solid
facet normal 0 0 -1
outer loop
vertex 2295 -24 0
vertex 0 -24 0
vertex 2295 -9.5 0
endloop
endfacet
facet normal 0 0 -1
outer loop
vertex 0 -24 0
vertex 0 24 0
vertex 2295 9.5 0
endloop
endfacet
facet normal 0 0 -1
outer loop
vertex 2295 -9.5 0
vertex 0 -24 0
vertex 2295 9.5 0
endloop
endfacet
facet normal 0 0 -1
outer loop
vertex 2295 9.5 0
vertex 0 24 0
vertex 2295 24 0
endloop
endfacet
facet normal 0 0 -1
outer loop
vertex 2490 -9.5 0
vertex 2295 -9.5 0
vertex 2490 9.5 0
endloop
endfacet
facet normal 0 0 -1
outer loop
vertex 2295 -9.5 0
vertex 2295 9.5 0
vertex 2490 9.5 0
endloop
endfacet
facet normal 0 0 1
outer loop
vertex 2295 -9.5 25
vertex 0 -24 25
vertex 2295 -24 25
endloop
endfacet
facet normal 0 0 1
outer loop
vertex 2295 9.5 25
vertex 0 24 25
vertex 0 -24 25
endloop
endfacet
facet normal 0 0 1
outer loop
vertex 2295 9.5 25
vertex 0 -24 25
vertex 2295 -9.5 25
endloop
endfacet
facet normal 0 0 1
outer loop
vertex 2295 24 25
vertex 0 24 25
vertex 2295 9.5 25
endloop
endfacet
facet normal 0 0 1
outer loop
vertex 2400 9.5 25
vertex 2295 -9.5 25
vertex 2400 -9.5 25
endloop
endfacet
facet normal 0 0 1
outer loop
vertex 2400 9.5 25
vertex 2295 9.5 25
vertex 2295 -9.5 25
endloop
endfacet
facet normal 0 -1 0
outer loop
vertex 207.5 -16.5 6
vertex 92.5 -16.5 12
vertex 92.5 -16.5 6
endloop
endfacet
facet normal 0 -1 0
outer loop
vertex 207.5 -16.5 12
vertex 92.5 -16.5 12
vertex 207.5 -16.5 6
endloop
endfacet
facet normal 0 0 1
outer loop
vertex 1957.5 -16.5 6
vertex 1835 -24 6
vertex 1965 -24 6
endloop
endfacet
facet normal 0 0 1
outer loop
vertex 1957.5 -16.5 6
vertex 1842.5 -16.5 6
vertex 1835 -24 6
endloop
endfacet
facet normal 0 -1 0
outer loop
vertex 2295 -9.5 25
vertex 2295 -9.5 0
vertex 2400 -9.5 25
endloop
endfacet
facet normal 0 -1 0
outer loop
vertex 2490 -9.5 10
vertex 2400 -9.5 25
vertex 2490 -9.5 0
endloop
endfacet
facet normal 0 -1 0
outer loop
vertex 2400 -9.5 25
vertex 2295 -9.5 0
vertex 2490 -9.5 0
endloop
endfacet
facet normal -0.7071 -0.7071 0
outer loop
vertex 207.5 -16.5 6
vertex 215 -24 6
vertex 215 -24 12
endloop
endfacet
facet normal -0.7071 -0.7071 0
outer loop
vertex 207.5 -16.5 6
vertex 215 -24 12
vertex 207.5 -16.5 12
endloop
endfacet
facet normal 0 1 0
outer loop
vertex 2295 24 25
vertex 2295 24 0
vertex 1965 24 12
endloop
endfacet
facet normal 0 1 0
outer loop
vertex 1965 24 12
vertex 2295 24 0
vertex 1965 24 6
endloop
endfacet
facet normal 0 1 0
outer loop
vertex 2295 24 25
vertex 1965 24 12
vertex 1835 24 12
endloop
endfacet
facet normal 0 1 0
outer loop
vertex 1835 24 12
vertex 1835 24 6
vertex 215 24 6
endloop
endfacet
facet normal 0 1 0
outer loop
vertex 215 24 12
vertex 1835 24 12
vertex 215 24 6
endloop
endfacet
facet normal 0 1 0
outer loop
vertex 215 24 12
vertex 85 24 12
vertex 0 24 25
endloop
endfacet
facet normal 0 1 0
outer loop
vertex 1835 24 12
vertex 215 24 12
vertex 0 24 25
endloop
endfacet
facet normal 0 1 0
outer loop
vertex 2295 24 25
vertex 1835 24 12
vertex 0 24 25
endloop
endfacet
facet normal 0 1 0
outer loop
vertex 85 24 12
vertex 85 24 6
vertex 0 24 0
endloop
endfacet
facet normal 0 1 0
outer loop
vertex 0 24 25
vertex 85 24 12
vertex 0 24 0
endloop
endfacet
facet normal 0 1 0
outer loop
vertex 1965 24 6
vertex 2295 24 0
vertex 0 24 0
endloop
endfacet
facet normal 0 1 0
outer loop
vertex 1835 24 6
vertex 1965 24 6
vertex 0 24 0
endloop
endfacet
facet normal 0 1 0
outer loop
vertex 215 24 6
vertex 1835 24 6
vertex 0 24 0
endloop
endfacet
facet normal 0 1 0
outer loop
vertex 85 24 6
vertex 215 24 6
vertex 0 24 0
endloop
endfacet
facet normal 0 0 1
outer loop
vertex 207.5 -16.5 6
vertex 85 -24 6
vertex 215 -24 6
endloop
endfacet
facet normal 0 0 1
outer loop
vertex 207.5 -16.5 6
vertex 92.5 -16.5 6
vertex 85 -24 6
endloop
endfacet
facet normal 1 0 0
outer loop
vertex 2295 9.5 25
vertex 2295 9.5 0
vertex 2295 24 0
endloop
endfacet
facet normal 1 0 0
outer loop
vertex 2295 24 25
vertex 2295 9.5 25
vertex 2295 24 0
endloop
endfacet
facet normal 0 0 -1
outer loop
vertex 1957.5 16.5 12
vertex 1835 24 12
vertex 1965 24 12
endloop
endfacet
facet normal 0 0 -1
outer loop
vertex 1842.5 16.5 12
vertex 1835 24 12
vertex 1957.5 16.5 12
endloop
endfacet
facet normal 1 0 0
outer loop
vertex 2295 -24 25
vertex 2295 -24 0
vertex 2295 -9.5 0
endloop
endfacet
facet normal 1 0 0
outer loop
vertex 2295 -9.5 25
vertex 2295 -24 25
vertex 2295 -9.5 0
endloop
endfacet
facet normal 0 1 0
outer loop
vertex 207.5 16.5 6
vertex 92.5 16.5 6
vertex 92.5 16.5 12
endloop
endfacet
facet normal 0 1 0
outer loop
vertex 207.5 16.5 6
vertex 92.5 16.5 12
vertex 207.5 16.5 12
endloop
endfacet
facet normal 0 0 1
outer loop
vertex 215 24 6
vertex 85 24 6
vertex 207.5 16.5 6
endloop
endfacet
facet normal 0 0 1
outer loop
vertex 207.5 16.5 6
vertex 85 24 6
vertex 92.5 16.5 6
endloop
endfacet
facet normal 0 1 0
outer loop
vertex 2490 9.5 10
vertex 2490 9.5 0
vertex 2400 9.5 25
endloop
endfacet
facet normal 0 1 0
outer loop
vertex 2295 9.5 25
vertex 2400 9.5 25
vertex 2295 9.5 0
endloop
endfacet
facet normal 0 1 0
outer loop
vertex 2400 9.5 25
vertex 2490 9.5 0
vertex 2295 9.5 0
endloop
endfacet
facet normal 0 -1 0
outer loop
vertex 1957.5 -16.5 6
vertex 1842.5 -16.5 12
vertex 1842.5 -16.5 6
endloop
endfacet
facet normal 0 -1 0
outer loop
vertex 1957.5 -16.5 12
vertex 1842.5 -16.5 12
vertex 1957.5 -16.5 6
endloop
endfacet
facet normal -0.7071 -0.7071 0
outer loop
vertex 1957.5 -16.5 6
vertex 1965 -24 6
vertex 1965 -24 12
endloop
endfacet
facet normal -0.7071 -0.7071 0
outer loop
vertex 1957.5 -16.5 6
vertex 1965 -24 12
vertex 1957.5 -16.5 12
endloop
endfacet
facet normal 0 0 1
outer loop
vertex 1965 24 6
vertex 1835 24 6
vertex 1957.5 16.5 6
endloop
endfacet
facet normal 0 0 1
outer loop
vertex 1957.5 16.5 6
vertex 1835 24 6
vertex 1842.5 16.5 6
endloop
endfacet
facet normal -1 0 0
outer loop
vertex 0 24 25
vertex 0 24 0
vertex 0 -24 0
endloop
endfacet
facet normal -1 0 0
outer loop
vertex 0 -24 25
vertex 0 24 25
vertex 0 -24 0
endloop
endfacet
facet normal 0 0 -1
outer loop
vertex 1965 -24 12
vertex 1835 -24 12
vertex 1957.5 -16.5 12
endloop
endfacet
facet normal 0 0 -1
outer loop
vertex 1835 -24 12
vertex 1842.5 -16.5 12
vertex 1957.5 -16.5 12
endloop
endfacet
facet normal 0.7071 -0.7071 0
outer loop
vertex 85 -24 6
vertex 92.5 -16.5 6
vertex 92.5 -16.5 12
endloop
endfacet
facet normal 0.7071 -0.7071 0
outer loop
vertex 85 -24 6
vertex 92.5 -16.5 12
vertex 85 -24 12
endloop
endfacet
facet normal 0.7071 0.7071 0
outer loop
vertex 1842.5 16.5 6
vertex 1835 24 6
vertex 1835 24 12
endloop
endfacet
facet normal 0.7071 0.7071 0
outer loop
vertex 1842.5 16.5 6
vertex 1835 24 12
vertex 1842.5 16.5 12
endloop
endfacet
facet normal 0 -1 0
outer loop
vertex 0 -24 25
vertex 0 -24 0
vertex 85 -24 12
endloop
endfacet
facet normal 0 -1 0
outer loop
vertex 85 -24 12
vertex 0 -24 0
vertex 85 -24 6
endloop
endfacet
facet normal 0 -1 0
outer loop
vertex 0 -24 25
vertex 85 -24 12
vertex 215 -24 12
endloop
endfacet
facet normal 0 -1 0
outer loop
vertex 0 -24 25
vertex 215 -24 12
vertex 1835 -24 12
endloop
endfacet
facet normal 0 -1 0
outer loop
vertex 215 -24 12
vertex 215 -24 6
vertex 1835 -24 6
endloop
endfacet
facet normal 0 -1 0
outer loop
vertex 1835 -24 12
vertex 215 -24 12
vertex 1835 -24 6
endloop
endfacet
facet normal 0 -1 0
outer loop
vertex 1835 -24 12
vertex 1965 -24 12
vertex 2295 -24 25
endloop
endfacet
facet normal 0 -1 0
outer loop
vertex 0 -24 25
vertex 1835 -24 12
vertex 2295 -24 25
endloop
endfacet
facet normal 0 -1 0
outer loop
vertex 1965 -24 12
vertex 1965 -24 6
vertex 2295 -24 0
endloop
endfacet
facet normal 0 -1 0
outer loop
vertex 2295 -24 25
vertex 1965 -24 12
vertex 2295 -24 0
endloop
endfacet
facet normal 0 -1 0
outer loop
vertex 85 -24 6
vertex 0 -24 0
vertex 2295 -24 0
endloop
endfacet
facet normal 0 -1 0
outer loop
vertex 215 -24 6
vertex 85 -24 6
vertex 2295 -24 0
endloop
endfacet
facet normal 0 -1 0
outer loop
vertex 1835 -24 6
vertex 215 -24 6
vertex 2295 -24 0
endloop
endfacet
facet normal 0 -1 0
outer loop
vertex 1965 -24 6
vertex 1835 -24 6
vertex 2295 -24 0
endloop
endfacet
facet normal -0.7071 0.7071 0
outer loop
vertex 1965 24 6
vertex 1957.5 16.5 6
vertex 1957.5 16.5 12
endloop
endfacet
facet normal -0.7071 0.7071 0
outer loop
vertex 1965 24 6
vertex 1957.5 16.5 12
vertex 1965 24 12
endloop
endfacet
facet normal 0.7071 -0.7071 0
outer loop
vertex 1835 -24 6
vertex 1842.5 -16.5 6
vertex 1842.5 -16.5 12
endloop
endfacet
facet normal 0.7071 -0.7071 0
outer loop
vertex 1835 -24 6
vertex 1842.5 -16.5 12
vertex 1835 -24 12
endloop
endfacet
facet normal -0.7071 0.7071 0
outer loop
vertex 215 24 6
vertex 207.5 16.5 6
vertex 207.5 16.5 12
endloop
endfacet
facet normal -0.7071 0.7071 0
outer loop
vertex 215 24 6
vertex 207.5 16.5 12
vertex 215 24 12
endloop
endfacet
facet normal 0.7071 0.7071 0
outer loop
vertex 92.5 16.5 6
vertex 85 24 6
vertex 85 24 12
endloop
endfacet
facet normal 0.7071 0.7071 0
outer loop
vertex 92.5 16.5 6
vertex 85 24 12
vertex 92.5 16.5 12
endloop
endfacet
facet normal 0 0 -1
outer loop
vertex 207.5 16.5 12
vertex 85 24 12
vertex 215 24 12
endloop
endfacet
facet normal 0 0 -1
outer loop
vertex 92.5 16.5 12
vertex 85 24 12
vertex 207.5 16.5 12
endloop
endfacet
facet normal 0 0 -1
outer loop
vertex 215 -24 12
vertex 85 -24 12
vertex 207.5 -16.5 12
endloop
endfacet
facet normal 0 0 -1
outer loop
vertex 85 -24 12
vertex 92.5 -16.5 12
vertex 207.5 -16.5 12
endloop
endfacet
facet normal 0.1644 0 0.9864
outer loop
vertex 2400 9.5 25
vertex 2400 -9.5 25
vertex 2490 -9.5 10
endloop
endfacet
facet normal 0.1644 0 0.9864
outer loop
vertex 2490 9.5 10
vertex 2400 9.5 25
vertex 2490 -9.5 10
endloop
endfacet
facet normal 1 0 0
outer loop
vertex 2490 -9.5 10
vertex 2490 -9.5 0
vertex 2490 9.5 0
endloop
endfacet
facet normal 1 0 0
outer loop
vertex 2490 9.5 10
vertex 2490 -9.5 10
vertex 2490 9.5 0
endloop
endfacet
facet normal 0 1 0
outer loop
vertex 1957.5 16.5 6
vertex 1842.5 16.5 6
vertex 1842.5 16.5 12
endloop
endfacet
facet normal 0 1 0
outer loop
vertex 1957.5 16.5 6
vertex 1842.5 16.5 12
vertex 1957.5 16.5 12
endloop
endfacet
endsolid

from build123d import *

# Parameters (mm, degrees)
EXTRUDE_1_DEPTH        = 25
SKETCH_2_W             = 115
SKETCH_2_H             = 6
CUT_EXTRUDE_1_DEPTH    = 7.5
MIRROR_START           = 6
MIRROR_1_DEPTH         = 6
PATTERN_LINEAR_1_COUNT = 2
PATTERN_LINEAR_1_PITCH = 1750
CUT_EXTRUDE_2_REACH    = 2492.351


# Read off the part's stored shape, not the designer's step: 镜向1
with BuildPart() as part:
    # 草图1 → 凸台-拉伸1 (new body)
    with BuildSketch(Plane.XY):
        Polygon((0, 24), (0, -24), (2295, -24), (2295, -9.5), (2490, -9.5), (2490, 9.5), (2295, 9.5), (2295, 24), align=None)
    extrude(amount=EXTRUDE_1_DEPTH)

    # 草图2 → 切除-拉伸1 (cut)
    with BuildSketch(Plane.XZ.offset(24)):
        with Locations((1900, 9)):
            Rectangle(SKETCH_2_W, SKETCH_2_H)
    cut_extrude_1 = extrude(amount=-CUT_EXTRUDE_1_DEPTH, mode=Mode.SUBTRACT)

    # 镜向1 outline → 镜向1 (cut)
    with BuildSketch(Plane.XY.offset(MIRROR_START)):
        Polygon((1842.5, 16.5), (1957.5, 16.5), (1965, 24), (1835, 24), align=None)
        Polygon((1835, -24), (1842.5, -24), (1842.5, -16.5), align=None)
        Polygon((1965, -24), (1957.5, -16.5), (1957.5, -24), align=None)
    mirror_1 = extrude(amount=MIRROR_1_DEPTH, mode=Mode.SUBTRACT)

    # 阵列(线性)1: 切除-拉伸1, 镜向1 ×2
    with Locations(*[(-i * PATTERN_LINEAR_1_PITCH, 0, 0) for i in range(1, PATTERN_LINEAR_1_COUNT)]):
        add(cut_extrude_1, mode=Mode.SUBTRACT)
        add(mirror_1, mode=Mode.SUBTRACT)

    # 草图3 → 切除-拉伸2 (cut, up to next)
    with BuildSketch(Plane.XZ.offset(9.5), mode=Mode.PRIVATE) as cut_extrude_2_sk1:
        Polygon((2400, 25), (2490, 10), (2490, 25), align=None)
    cut_extrude_2_tool1 = extrude(cut_extrude_2_sk1.sketch, amount=-CUT_EXTRUDE_2_REACH, mode=Mode.PRIVATE) & part.part
    add(cut_extrude_2_tool1.solids().sort_by_distance((2460, -9.5, 20))[0], mode=Mode.SUBTRACT)


solid = part.part
